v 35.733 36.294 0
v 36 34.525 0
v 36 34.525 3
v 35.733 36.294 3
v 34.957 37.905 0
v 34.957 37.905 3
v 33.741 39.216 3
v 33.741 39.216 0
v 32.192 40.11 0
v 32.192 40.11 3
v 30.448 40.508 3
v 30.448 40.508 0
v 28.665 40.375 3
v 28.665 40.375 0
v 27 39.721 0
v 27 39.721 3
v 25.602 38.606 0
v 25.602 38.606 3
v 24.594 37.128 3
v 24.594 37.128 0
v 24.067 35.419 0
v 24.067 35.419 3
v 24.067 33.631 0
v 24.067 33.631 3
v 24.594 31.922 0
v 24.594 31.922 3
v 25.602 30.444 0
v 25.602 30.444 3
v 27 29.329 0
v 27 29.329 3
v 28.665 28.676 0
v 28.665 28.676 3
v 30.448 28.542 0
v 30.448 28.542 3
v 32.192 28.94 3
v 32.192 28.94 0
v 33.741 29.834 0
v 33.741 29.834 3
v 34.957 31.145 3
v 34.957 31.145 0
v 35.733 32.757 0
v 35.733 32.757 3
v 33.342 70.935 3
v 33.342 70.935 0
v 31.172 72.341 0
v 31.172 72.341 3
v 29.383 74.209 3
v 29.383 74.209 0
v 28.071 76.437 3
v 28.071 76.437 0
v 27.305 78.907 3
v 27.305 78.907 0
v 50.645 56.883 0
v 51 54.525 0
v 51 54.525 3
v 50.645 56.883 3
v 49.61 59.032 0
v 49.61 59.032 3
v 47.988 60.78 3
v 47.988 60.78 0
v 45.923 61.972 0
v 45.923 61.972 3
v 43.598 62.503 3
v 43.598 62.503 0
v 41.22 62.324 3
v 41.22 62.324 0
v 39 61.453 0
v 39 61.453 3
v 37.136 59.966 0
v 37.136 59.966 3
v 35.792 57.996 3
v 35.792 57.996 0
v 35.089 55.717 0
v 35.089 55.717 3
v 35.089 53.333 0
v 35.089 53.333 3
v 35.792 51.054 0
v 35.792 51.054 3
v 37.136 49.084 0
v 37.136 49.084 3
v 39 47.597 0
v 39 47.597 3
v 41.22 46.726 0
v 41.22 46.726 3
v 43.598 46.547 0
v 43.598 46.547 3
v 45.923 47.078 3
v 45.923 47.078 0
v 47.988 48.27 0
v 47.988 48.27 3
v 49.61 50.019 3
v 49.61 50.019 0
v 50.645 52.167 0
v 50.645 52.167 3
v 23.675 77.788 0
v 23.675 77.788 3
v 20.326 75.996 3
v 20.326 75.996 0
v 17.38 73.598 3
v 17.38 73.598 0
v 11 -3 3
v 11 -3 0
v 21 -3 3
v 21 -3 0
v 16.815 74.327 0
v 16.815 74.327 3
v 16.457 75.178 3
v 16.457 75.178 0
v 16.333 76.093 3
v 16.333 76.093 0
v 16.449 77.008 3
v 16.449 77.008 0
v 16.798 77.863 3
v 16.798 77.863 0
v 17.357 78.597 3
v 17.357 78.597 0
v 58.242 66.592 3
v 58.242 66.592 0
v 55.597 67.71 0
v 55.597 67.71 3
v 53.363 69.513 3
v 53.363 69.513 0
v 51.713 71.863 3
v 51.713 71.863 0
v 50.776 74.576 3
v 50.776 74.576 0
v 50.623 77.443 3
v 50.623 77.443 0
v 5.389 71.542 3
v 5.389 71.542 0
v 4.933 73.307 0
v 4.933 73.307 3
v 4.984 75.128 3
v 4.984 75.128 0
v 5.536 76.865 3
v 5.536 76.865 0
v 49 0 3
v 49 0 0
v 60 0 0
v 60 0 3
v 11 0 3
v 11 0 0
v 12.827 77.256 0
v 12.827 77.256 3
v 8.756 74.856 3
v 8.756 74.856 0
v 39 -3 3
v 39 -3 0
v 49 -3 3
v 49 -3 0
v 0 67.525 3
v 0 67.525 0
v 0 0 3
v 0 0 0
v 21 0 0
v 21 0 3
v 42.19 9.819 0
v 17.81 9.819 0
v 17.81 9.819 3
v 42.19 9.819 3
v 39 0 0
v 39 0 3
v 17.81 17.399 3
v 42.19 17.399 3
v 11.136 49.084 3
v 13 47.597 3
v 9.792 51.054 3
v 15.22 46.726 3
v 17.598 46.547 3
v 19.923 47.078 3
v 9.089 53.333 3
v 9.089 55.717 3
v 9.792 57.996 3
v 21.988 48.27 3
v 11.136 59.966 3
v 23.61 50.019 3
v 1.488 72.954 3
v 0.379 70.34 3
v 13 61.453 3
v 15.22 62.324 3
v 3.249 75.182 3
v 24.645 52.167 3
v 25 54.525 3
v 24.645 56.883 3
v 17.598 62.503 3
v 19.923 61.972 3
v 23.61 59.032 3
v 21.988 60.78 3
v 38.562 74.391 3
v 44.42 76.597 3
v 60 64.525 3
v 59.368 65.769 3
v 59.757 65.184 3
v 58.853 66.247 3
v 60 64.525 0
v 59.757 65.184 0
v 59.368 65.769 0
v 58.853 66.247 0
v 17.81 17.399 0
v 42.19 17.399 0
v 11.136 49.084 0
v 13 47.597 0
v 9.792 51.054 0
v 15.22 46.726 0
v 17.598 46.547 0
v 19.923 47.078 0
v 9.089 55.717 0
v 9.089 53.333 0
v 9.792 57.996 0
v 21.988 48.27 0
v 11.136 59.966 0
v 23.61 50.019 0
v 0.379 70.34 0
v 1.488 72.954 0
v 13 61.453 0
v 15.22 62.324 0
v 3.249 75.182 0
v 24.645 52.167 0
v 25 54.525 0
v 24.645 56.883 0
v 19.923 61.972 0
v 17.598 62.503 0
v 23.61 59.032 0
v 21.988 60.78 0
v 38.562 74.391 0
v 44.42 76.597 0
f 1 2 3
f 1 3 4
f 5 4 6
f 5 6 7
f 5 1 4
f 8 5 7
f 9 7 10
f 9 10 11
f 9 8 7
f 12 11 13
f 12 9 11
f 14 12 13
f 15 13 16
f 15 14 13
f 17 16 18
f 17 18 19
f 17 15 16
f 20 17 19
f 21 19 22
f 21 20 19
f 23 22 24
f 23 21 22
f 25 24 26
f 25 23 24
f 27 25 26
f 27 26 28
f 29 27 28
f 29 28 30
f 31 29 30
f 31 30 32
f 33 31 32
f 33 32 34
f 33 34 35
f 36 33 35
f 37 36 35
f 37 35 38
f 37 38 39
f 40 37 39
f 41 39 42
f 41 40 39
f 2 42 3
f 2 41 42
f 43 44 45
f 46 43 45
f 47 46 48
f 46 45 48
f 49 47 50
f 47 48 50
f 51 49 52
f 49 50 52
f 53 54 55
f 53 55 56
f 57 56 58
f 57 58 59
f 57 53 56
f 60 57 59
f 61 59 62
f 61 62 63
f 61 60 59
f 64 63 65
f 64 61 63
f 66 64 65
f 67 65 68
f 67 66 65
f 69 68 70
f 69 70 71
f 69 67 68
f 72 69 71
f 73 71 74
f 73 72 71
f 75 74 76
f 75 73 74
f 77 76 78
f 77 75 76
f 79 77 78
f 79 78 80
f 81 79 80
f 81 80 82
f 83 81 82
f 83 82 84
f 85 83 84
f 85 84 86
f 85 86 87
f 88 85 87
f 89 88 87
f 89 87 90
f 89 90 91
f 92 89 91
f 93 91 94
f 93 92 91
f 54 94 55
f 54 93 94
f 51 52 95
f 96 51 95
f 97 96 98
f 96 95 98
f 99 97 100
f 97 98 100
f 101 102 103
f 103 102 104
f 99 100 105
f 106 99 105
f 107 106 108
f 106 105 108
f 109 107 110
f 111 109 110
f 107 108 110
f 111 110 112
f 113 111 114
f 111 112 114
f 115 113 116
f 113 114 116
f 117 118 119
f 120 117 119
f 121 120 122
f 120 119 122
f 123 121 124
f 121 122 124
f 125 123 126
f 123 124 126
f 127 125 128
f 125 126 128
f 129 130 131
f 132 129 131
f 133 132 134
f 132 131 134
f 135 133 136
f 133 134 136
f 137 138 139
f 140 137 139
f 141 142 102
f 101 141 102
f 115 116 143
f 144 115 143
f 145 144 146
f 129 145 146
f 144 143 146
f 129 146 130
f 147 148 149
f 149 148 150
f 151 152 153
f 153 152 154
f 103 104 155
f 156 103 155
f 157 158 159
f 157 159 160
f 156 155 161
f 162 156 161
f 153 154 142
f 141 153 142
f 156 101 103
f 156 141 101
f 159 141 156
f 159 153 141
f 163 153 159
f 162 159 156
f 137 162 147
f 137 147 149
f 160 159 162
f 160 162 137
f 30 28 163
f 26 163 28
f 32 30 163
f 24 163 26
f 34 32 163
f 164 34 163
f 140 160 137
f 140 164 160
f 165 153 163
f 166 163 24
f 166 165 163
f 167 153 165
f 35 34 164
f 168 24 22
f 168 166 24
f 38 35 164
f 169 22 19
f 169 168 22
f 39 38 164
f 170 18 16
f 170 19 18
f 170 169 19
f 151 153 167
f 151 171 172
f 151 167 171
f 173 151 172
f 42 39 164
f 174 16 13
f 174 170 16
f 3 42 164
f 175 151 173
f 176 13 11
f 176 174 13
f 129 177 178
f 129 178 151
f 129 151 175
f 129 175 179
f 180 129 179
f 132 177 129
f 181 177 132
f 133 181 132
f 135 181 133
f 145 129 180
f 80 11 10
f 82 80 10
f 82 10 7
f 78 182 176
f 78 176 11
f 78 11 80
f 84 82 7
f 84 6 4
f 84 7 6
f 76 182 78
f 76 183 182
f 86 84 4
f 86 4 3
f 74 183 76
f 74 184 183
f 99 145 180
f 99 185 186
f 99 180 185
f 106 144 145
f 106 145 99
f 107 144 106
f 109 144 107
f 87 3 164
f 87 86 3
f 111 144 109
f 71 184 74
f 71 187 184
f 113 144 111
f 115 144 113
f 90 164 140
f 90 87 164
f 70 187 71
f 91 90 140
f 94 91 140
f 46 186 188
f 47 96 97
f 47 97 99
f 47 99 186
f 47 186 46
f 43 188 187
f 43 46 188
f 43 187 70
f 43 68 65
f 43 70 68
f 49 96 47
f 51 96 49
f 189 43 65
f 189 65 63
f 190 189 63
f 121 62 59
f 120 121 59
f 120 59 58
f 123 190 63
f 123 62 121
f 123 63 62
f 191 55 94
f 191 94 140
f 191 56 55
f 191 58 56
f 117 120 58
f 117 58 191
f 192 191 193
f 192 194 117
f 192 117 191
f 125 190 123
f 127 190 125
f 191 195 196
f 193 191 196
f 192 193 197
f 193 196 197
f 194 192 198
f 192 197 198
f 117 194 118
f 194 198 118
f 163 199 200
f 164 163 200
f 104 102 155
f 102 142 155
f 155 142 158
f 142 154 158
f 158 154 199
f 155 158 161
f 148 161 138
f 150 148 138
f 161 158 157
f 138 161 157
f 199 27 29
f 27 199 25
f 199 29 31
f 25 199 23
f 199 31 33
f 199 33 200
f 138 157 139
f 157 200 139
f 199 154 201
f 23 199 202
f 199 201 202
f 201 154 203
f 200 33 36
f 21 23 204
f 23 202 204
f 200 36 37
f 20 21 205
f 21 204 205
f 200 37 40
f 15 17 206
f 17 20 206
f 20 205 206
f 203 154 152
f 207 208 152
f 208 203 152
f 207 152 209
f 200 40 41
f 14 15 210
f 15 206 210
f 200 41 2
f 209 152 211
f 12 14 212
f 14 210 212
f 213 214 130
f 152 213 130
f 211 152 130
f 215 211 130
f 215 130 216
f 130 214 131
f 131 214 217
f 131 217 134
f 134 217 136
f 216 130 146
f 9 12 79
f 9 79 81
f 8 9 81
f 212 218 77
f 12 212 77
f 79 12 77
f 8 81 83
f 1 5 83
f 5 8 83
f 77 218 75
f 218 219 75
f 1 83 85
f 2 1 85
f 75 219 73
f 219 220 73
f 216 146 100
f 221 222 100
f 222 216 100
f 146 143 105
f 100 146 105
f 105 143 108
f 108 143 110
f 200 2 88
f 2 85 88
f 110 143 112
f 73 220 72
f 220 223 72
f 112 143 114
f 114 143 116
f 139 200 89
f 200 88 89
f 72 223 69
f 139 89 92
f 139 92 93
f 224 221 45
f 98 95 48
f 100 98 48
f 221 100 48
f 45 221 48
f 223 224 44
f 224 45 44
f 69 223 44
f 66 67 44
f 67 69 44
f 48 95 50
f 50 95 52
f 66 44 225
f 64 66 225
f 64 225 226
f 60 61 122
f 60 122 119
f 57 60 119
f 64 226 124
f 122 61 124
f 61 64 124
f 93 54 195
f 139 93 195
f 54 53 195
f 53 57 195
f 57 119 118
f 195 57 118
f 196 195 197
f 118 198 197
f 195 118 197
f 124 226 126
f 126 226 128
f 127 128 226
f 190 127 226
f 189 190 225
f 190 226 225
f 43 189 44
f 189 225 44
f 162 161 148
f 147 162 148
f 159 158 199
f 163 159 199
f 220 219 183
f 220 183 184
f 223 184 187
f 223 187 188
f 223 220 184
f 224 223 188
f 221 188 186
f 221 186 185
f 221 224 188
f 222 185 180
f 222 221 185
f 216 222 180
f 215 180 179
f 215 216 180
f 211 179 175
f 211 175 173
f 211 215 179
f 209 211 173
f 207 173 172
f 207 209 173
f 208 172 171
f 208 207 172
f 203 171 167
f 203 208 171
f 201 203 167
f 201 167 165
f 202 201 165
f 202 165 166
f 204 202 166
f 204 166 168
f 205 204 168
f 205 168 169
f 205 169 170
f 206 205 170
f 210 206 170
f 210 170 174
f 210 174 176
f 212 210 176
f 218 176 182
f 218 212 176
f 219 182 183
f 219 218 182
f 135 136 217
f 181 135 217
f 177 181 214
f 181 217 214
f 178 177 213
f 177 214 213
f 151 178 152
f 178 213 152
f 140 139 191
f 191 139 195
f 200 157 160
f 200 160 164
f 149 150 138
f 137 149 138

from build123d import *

# Parameters (mm, degrees)
MODEL_R                 = 8
MODEL_R_2               = 6
MODEL_W                 = 24.38
MODEL_H                 = 7.58
SALIENTE_EXTRUIR1_DEPTH = 3


with BuildPart() as part:
    # Model → Saliente-Extruir1 (new body)
    with BuildSketch(Plane.XY):
        with BuildLine():
            Line((11, -3), (21, -3))
            Line((21, -3), (21, 0))
            Line((21, 0), (39, 0))
            Line((39, 0), (39, -3))
            Line((39, -3), (49, -3))
            Line((49, -3), (49, 0))
            Line((49, 0), (60, 0))
            Line((60, 0), (60, 64.525075061))
            ThreePointArc((60, 64.525075061), (59.367904368, 65.768881419), (58.24156757, 66.592267452))
            ThreePointArc((58.24156757, 66.592267452), (52.456145593, 70.630164346), (50.622765109, 77.442978358))
            ThreePointArc((50.622765109, 77.442978358), (41.429140717, 75.658422531), (33.342205195, 70.935198758))
            ThreePointArc((33.342205195, 70.935198758), (29.382797484, 74.208773689), (27.305382782, 78.907449077))
            ThreePointArc((27.305382782, 78.907449077), (21.957335965, 76.972641815), (17.379828576, 73.597510706))
            ThreePointArc((17.379828576, 73.597510706), (16.332778743, 76.092709519), (17.356774707, 78.597457558))
            ThreePointArc((17.356774707, 78.597457558), (10.717974601, 76.180887797), (5.38917768, 71.542202679))
            ThreePointArc((5.38917768, 71.542202679), (4.894477072, 74.219269154), (5.536201967, 76.864945392))
            ThreePointArc((5.536201967, 76.864945392), (1.487784828, 72.953916782), (0, 67.525075061))
            Line((0, 67.525075061), (0, 57.374648319))
            Line((0, 57.374648319), (0, 33.26253753))
            Line((0, 33.26253753), (0, 11.520097779))
            Line((0, 11.520097779), (0, 0))
            Line((0, 0), (11, 0))
            Line((11, 0), (11, -3))
        make_face()
        with Locations((43, 54.525075061)):
            Circle(MODEL_R, mode=Mode.SUBTRACT)
        with Locations((17, 54.525075061)):
            Circle(MODEL_R, mode=Mode.SUBTRACT)
        with Locations((30, 34.525075061)):
            Circle(MODEL_R_2, mode=Mode.SUBTRACT)
        with Locations((30, 13.609080994)):
            Rectangle(MODEL_W, MODEL_H, mode=Mode.SUBTRACT)
    extrude(amount=SALIENTE_EXTRUIR1_DEPTH)


solid = part.part
